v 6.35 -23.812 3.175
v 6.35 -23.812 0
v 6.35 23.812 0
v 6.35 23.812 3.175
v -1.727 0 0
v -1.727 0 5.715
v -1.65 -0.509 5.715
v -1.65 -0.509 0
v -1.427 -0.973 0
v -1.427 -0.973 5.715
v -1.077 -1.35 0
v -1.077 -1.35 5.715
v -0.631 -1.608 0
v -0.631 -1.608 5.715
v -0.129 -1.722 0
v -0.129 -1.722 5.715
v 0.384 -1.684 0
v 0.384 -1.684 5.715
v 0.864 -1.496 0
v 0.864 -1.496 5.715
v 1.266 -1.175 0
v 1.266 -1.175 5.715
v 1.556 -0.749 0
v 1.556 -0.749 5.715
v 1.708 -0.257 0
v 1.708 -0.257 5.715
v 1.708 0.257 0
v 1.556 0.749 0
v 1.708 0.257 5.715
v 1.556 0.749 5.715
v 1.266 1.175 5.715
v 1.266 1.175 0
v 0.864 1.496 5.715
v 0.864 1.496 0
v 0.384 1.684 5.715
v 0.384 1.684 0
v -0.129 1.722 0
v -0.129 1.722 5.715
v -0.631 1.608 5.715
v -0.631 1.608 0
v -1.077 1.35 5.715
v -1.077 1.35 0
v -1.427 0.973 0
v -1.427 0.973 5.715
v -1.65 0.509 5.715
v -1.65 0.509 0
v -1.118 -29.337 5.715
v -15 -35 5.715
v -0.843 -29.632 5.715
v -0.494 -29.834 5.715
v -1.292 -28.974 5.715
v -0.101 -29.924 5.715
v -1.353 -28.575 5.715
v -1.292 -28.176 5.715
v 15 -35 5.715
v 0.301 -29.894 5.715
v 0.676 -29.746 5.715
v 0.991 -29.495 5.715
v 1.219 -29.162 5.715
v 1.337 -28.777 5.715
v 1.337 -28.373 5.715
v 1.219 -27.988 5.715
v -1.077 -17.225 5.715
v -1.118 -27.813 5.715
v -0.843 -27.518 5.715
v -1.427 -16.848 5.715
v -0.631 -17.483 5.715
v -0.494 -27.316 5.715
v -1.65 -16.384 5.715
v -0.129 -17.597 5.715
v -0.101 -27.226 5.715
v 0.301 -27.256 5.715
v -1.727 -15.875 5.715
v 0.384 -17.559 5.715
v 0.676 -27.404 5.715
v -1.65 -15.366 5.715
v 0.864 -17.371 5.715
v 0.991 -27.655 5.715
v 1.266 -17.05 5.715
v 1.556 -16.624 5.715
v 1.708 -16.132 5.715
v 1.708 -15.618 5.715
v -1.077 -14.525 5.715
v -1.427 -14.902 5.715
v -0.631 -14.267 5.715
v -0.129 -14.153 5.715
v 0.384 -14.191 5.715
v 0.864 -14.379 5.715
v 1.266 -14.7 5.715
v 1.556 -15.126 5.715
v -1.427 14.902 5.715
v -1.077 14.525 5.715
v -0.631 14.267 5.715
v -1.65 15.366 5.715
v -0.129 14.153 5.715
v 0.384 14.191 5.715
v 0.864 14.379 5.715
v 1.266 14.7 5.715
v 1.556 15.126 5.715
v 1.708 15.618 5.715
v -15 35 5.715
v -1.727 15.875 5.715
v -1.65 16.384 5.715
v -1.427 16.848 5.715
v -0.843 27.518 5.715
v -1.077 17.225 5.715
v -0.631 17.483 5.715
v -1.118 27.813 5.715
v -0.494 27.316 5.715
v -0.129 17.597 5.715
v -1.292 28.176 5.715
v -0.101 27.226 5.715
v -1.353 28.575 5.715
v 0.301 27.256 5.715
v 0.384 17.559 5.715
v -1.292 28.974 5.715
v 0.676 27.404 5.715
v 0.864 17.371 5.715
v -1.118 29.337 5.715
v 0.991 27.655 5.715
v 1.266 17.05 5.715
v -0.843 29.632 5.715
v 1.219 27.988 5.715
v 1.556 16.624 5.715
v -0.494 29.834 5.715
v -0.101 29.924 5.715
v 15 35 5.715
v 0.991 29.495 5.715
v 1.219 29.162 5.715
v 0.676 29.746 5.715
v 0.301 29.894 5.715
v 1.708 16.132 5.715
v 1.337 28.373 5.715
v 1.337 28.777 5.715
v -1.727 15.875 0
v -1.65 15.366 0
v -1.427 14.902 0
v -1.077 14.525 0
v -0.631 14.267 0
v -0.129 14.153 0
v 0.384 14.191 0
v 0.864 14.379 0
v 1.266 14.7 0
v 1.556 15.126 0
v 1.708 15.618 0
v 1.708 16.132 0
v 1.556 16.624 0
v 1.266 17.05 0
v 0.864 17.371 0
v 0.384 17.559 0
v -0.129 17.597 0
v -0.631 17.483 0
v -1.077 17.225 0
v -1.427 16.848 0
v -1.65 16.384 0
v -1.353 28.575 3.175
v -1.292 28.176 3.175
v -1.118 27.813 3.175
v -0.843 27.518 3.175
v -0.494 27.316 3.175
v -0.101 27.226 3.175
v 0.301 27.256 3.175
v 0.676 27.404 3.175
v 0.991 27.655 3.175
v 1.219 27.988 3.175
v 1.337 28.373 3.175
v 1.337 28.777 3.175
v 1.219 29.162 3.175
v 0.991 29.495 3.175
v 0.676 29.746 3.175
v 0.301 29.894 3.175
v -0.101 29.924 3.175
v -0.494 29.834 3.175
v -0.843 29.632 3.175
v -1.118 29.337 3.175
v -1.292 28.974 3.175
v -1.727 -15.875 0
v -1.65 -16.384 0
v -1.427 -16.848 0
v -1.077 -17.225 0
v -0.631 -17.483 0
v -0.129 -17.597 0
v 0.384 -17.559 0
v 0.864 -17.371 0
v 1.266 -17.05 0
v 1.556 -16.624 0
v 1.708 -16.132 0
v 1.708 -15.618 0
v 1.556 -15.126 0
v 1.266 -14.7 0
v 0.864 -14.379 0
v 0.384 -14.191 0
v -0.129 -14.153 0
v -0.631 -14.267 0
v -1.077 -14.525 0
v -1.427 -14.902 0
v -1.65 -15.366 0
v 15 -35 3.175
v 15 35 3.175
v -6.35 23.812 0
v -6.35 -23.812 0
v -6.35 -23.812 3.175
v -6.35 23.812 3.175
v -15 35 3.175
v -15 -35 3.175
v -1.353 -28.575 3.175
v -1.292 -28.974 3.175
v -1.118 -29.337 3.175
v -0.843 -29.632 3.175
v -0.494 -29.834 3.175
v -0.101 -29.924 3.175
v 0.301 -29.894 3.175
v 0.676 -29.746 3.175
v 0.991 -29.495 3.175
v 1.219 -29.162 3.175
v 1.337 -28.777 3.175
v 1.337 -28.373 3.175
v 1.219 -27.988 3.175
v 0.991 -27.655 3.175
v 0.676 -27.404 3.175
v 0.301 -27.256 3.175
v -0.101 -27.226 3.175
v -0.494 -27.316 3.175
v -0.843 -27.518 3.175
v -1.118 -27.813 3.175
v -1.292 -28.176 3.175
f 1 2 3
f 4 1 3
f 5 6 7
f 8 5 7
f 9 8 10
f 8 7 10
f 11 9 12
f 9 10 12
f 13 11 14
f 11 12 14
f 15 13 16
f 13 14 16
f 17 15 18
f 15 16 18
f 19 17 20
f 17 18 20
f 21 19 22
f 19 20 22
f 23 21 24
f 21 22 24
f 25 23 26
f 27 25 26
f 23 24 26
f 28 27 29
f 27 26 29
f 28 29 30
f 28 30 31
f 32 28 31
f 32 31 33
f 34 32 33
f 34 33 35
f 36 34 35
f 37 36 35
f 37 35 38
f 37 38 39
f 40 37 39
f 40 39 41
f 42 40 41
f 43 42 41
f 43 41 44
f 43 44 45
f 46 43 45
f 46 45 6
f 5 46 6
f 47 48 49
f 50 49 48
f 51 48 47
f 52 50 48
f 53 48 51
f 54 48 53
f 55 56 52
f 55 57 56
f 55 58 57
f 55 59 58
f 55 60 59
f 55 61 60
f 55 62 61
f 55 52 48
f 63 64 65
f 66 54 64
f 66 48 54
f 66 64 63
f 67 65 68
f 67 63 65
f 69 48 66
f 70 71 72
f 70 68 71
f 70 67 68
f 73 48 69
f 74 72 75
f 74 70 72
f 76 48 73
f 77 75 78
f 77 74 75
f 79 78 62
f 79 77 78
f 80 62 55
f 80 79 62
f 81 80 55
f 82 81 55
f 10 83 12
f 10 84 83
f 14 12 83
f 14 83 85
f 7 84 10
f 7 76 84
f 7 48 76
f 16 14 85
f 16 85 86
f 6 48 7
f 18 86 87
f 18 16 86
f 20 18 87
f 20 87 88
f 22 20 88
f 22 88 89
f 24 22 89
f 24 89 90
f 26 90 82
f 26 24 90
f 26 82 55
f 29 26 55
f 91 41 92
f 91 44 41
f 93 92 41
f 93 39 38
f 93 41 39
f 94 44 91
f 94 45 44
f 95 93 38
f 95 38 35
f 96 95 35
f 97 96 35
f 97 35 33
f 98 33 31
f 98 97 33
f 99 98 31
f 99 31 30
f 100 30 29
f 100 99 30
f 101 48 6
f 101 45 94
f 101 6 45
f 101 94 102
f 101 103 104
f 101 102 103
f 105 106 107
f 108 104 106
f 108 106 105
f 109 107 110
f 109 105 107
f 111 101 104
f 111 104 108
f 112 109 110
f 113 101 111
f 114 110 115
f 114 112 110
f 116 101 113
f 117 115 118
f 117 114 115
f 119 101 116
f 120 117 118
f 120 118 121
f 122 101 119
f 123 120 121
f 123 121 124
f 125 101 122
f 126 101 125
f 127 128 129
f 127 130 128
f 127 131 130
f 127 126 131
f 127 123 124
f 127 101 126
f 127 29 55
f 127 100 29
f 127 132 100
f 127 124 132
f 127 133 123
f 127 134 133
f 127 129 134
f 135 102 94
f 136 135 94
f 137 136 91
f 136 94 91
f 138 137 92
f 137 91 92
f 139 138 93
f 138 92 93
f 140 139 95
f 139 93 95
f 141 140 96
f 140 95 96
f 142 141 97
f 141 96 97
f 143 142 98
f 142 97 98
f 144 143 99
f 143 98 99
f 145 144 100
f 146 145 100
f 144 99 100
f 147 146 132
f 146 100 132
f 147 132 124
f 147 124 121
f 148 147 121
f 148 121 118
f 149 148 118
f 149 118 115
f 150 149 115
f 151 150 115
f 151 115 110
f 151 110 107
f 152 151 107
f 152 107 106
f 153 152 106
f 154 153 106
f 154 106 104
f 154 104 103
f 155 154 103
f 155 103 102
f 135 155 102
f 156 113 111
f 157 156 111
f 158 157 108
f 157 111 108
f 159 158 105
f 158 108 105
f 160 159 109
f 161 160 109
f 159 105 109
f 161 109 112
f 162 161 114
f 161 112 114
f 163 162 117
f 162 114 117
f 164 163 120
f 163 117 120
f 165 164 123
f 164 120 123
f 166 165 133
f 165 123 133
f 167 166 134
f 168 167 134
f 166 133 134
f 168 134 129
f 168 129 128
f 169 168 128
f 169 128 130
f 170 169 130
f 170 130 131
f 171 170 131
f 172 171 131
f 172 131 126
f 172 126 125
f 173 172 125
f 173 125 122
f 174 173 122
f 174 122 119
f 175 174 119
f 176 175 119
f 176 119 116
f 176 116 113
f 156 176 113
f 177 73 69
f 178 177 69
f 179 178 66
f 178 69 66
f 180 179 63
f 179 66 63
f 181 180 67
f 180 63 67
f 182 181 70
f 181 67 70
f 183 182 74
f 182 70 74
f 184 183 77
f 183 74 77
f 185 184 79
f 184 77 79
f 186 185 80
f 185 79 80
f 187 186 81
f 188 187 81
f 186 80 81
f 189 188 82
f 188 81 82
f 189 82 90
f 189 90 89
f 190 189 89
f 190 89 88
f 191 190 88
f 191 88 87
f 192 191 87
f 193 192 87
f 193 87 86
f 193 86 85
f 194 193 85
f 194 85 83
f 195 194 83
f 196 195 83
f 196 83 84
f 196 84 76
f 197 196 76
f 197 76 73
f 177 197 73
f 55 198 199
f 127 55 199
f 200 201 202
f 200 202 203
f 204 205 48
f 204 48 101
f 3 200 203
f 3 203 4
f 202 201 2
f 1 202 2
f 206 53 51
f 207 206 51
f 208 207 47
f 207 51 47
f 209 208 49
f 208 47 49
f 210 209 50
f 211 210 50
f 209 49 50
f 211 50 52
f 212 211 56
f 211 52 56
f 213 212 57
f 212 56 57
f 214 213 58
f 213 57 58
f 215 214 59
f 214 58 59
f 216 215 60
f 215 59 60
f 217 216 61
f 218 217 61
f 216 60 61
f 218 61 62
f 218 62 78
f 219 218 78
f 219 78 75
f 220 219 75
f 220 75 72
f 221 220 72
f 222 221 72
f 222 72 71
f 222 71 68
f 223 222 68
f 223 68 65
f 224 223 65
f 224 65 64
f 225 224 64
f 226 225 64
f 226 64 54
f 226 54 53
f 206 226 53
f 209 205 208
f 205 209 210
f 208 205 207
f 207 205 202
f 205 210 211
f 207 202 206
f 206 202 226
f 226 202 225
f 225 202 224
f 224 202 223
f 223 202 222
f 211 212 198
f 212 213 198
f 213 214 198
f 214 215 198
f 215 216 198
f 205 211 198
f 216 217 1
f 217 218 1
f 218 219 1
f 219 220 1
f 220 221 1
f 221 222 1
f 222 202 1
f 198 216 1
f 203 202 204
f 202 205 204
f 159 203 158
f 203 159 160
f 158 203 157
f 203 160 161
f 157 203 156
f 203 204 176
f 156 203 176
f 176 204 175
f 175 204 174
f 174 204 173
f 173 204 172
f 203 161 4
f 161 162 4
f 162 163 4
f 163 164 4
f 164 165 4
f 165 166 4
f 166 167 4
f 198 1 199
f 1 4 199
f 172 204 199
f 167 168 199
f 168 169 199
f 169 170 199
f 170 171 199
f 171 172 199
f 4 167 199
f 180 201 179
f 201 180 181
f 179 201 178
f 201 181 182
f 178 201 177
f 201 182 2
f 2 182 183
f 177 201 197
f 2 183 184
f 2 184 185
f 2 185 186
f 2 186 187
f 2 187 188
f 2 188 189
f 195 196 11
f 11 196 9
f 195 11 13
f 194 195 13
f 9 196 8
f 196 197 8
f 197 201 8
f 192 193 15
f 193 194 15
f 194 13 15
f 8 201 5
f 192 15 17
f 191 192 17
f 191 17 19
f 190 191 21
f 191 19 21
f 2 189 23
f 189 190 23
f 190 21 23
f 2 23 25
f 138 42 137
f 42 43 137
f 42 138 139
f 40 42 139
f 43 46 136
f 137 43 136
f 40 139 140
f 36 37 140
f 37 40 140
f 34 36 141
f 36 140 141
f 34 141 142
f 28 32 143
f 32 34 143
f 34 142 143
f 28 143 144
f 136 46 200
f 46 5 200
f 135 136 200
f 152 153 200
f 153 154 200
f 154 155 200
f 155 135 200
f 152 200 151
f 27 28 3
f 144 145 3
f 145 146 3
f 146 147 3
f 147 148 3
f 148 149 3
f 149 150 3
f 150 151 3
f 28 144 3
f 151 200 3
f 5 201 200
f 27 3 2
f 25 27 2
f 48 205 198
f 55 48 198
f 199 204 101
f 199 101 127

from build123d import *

# Parameters (mm, degrees)
F0_W     = 12.7
F0_H     = 47.625
F1_DEPTH = 3.175
F2_W     = 30
F2_H     = 70
F3_DEPTH = 2.54
F5_D     = 3.4544
F5_DEPTH = 15.08125
F5_TIP   = 1.0378064612
F7_D     = 2.7051
F7_DEPTH = 15.0876
F7_TIP   = 0.8126940303


with BuildPart() as f1:
    # F0 (on Top) → F1 (new body)
    with BuildSketch(Plane.XY):
        Rectangle(F0_W, F0_H)
    extrude(amount=F1_DEPTH)

    # F2 (on face) → F3 (join)
    with BuildSketch(Plane.XY.offset(3.175)):
        Rectangle(F2_W, F2_H)
    extrude(amount=F3_DEPTH)

    # F5
    with Locations(Plane(origin=(0, 0, 0), x_dir=(1, 0, 0), z_dir=(0, 0, -1))):
        with Locations((0, 15.875), (0, 0), (0, -15.875)):
            Hole(F5_D / 2, depth=F5_DEPTH)
            with Locations((0, 0, -(F5_DEPTH + F5_TIP / 2))):  # 118° drill point
                Cone(0, F5_D / 2, F5_TIP, mode=Mode.SUBTRACT)

    # F7
    with Locations(Plane(origin=(0, 0, 3.175), x_dir=(1, 0, 0), z_dir=(0, 0, -1))):
        with Locations((0, 28.575), (0, -28.575)):
            Hole(F7_D / 2, depth=F7_DEPTH)
            with Locations((0, 0, -(F7_DEPTH + F7_TIP / 2))):  # 118° drill point
                Cone(0, F7_D / 2, F7_TIP, mode=Mode.SUBTRACT)


solid = f1.part
